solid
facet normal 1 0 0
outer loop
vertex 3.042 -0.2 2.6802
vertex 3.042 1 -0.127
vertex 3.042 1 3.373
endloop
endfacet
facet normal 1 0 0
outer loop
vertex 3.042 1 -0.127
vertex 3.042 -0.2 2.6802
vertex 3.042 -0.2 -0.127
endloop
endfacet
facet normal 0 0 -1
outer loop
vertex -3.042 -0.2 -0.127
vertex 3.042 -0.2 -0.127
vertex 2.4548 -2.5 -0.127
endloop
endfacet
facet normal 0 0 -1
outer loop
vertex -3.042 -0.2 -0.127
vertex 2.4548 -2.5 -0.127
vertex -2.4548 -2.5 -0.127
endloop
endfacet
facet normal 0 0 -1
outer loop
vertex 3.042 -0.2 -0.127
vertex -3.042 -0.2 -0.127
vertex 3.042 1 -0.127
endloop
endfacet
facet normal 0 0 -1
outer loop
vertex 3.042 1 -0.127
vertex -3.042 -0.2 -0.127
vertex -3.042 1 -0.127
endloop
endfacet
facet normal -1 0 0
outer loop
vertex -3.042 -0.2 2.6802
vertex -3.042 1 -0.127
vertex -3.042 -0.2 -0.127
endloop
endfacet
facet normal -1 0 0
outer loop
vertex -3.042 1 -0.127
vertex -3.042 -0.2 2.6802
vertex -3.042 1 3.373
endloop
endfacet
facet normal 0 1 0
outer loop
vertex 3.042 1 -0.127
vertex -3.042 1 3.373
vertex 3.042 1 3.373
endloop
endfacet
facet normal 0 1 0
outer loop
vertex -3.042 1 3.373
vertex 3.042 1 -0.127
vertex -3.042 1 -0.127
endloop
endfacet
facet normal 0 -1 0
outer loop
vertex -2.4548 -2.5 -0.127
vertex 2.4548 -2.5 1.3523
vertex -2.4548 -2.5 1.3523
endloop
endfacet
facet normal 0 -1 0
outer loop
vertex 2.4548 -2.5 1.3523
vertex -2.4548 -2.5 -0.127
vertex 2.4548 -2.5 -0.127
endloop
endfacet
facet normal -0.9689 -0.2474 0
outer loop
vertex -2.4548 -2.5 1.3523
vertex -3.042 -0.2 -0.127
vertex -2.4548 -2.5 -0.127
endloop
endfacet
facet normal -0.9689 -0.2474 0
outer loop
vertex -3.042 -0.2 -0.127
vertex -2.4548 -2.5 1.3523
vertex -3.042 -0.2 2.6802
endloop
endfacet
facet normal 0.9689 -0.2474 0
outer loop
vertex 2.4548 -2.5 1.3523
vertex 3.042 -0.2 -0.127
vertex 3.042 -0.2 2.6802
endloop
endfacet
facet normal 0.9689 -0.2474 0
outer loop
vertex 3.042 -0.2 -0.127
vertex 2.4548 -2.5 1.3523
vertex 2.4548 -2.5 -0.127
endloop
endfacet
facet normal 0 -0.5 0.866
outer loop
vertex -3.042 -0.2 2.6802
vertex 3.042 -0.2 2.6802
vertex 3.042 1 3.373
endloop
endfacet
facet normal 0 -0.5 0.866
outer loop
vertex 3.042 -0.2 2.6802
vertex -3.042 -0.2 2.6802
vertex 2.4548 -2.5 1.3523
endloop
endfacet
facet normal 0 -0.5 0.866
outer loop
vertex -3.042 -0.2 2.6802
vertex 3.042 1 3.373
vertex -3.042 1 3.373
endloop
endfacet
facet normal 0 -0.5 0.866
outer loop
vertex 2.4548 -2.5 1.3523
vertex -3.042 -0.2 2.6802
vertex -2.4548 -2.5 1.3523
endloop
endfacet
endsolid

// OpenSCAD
$subpart=1;
include <../Excahaul_latest.scad>;
scale(0.01) scoopVolume();
// Volume of STL is in liters
